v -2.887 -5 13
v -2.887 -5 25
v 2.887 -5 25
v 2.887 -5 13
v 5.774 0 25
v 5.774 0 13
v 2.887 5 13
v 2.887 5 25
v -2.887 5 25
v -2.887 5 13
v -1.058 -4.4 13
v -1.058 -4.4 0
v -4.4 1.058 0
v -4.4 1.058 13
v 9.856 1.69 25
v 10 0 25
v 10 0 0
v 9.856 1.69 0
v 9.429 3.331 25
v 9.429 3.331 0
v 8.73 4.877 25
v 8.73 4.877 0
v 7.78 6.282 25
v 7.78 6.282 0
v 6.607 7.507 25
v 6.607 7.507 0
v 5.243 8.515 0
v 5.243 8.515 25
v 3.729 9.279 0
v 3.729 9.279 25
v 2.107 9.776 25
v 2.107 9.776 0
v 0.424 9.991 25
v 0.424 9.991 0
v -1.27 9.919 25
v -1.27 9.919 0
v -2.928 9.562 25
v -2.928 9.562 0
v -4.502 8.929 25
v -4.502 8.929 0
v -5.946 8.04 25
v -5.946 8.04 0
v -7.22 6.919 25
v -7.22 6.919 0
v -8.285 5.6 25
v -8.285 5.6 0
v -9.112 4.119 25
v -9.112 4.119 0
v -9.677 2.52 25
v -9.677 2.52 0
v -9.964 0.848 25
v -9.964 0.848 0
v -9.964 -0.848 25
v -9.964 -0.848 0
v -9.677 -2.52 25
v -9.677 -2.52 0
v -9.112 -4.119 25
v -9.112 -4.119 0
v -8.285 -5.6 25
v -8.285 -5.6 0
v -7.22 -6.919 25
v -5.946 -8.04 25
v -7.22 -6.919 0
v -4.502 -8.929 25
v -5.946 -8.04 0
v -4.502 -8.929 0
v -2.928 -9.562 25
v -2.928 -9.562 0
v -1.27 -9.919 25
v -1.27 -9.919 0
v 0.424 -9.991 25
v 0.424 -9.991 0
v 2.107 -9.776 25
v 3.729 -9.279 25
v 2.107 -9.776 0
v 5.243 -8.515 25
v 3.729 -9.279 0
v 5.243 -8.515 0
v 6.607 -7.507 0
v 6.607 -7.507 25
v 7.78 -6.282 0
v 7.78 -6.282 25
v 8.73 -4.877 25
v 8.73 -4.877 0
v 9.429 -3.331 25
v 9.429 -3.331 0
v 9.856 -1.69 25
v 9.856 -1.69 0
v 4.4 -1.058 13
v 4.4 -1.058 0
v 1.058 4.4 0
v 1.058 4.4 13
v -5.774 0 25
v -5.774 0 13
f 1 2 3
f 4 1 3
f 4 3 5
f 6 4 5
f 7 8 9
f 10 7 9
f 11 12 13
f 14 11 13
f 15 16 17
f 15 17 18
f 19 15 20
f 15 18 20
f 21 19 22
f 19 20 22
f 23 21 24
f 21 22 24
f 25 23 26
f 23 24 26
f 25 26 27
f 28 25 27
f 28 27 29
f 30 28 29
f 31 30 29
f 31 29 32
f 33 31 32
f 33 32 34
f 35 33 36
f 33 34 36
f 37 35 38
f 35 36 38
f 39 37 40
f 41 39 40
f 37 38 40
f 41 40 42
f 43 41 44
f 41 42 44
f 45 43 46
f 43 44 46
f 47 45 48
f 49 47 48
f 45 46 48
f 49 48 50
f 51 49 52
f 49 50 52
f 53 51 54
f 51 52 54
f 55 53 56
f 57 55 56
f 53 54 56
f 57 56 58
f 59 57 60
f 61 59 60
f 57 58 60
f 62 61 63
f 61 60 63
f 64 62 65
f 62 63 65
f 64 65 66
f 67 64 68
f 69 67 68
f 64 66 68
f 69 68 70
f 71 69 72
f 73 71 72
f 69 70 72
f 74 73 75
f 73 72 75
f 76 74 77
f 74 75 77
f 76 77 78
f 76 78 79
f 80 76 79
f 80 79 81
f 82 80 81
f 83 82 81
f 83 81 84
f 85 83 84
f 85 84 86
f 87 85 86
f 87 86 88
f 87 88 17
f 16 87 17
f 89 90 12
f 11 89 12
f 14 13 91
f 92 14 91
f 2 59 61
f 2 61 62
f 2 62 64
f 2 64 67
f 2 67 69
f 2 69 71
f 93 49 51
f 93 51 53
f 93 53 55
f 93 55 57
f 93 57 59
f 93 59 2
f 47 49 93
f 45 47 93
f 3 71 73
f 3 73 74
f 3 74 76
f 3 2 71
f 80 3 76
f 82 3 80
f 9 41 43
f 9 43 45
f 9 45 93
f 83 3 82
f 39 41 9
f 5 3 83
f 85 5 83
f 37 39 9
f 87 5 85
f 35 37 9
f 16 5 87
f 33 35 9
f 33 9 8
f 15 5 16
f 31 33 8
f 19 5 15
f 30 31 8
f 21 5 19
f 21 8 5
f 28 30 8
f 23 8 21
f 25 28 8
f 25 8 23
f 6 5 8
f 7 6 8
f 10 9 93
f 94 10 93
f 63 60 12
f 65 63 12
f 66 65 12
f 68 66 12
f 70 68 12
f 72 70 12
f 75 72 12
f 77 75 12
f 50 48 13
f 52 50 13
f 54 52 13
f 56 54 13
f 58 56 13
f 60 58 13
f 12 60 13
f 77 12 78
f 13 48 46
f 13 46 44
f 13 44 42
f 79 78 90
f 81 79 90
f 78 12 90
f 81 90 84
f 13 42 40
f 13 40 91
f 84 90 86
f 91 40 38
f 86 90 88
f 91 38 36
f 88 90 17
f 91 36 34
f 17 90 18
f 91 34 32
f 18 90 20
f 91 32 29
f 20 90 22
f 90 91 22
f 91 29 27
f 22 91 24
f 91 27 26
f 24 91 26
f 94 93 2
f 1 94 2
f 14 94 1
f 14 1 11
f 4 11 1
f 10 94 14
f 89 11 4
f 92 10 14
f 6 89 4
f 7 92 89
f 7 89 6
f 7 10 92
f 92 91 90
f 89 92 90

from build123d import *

# Parameters (mm, degrees)
F0_R     = 10
F1_DEPTH = 25
F3_DEPTH = 12
F5_DEPTH = 25


with BuildPart() as f1:
    # F0 (on Top) → F1 (new body)
    with BuildSketch(Plane.XY):
        Circle(F0_R)
    extrude(amount=F1_DEPTH)

    # F2 (on face) → F3 (cut)
    with BuildSketch(Plane.XY.offset(25)):
        Polygon((2.886751, 5), (-2.886751, 5), (-5.773503, 0), (-2.886751, -5), (2.886751, -5), (5.773503, 0), align=None)
    extrude(amount=-F3_DEPTH, mode=Mode.SUBTRACT)

    # F4 (on face) → F5 (cut)
    with BuildSketch(Plane(origin=(0, 0, 0), x_dir=(1, 0, 0), z_dir=(0, 0, -1))):
        Polygon((1.057785, -4.400124), (4.400124, 1.057785), (-1.057785, 4.400124), (-4.400124, -1.057785), align=None)
    extrude(amount=-F5_DEPTH, mode=Mode.SUBTRACT)


solid = f1.part
